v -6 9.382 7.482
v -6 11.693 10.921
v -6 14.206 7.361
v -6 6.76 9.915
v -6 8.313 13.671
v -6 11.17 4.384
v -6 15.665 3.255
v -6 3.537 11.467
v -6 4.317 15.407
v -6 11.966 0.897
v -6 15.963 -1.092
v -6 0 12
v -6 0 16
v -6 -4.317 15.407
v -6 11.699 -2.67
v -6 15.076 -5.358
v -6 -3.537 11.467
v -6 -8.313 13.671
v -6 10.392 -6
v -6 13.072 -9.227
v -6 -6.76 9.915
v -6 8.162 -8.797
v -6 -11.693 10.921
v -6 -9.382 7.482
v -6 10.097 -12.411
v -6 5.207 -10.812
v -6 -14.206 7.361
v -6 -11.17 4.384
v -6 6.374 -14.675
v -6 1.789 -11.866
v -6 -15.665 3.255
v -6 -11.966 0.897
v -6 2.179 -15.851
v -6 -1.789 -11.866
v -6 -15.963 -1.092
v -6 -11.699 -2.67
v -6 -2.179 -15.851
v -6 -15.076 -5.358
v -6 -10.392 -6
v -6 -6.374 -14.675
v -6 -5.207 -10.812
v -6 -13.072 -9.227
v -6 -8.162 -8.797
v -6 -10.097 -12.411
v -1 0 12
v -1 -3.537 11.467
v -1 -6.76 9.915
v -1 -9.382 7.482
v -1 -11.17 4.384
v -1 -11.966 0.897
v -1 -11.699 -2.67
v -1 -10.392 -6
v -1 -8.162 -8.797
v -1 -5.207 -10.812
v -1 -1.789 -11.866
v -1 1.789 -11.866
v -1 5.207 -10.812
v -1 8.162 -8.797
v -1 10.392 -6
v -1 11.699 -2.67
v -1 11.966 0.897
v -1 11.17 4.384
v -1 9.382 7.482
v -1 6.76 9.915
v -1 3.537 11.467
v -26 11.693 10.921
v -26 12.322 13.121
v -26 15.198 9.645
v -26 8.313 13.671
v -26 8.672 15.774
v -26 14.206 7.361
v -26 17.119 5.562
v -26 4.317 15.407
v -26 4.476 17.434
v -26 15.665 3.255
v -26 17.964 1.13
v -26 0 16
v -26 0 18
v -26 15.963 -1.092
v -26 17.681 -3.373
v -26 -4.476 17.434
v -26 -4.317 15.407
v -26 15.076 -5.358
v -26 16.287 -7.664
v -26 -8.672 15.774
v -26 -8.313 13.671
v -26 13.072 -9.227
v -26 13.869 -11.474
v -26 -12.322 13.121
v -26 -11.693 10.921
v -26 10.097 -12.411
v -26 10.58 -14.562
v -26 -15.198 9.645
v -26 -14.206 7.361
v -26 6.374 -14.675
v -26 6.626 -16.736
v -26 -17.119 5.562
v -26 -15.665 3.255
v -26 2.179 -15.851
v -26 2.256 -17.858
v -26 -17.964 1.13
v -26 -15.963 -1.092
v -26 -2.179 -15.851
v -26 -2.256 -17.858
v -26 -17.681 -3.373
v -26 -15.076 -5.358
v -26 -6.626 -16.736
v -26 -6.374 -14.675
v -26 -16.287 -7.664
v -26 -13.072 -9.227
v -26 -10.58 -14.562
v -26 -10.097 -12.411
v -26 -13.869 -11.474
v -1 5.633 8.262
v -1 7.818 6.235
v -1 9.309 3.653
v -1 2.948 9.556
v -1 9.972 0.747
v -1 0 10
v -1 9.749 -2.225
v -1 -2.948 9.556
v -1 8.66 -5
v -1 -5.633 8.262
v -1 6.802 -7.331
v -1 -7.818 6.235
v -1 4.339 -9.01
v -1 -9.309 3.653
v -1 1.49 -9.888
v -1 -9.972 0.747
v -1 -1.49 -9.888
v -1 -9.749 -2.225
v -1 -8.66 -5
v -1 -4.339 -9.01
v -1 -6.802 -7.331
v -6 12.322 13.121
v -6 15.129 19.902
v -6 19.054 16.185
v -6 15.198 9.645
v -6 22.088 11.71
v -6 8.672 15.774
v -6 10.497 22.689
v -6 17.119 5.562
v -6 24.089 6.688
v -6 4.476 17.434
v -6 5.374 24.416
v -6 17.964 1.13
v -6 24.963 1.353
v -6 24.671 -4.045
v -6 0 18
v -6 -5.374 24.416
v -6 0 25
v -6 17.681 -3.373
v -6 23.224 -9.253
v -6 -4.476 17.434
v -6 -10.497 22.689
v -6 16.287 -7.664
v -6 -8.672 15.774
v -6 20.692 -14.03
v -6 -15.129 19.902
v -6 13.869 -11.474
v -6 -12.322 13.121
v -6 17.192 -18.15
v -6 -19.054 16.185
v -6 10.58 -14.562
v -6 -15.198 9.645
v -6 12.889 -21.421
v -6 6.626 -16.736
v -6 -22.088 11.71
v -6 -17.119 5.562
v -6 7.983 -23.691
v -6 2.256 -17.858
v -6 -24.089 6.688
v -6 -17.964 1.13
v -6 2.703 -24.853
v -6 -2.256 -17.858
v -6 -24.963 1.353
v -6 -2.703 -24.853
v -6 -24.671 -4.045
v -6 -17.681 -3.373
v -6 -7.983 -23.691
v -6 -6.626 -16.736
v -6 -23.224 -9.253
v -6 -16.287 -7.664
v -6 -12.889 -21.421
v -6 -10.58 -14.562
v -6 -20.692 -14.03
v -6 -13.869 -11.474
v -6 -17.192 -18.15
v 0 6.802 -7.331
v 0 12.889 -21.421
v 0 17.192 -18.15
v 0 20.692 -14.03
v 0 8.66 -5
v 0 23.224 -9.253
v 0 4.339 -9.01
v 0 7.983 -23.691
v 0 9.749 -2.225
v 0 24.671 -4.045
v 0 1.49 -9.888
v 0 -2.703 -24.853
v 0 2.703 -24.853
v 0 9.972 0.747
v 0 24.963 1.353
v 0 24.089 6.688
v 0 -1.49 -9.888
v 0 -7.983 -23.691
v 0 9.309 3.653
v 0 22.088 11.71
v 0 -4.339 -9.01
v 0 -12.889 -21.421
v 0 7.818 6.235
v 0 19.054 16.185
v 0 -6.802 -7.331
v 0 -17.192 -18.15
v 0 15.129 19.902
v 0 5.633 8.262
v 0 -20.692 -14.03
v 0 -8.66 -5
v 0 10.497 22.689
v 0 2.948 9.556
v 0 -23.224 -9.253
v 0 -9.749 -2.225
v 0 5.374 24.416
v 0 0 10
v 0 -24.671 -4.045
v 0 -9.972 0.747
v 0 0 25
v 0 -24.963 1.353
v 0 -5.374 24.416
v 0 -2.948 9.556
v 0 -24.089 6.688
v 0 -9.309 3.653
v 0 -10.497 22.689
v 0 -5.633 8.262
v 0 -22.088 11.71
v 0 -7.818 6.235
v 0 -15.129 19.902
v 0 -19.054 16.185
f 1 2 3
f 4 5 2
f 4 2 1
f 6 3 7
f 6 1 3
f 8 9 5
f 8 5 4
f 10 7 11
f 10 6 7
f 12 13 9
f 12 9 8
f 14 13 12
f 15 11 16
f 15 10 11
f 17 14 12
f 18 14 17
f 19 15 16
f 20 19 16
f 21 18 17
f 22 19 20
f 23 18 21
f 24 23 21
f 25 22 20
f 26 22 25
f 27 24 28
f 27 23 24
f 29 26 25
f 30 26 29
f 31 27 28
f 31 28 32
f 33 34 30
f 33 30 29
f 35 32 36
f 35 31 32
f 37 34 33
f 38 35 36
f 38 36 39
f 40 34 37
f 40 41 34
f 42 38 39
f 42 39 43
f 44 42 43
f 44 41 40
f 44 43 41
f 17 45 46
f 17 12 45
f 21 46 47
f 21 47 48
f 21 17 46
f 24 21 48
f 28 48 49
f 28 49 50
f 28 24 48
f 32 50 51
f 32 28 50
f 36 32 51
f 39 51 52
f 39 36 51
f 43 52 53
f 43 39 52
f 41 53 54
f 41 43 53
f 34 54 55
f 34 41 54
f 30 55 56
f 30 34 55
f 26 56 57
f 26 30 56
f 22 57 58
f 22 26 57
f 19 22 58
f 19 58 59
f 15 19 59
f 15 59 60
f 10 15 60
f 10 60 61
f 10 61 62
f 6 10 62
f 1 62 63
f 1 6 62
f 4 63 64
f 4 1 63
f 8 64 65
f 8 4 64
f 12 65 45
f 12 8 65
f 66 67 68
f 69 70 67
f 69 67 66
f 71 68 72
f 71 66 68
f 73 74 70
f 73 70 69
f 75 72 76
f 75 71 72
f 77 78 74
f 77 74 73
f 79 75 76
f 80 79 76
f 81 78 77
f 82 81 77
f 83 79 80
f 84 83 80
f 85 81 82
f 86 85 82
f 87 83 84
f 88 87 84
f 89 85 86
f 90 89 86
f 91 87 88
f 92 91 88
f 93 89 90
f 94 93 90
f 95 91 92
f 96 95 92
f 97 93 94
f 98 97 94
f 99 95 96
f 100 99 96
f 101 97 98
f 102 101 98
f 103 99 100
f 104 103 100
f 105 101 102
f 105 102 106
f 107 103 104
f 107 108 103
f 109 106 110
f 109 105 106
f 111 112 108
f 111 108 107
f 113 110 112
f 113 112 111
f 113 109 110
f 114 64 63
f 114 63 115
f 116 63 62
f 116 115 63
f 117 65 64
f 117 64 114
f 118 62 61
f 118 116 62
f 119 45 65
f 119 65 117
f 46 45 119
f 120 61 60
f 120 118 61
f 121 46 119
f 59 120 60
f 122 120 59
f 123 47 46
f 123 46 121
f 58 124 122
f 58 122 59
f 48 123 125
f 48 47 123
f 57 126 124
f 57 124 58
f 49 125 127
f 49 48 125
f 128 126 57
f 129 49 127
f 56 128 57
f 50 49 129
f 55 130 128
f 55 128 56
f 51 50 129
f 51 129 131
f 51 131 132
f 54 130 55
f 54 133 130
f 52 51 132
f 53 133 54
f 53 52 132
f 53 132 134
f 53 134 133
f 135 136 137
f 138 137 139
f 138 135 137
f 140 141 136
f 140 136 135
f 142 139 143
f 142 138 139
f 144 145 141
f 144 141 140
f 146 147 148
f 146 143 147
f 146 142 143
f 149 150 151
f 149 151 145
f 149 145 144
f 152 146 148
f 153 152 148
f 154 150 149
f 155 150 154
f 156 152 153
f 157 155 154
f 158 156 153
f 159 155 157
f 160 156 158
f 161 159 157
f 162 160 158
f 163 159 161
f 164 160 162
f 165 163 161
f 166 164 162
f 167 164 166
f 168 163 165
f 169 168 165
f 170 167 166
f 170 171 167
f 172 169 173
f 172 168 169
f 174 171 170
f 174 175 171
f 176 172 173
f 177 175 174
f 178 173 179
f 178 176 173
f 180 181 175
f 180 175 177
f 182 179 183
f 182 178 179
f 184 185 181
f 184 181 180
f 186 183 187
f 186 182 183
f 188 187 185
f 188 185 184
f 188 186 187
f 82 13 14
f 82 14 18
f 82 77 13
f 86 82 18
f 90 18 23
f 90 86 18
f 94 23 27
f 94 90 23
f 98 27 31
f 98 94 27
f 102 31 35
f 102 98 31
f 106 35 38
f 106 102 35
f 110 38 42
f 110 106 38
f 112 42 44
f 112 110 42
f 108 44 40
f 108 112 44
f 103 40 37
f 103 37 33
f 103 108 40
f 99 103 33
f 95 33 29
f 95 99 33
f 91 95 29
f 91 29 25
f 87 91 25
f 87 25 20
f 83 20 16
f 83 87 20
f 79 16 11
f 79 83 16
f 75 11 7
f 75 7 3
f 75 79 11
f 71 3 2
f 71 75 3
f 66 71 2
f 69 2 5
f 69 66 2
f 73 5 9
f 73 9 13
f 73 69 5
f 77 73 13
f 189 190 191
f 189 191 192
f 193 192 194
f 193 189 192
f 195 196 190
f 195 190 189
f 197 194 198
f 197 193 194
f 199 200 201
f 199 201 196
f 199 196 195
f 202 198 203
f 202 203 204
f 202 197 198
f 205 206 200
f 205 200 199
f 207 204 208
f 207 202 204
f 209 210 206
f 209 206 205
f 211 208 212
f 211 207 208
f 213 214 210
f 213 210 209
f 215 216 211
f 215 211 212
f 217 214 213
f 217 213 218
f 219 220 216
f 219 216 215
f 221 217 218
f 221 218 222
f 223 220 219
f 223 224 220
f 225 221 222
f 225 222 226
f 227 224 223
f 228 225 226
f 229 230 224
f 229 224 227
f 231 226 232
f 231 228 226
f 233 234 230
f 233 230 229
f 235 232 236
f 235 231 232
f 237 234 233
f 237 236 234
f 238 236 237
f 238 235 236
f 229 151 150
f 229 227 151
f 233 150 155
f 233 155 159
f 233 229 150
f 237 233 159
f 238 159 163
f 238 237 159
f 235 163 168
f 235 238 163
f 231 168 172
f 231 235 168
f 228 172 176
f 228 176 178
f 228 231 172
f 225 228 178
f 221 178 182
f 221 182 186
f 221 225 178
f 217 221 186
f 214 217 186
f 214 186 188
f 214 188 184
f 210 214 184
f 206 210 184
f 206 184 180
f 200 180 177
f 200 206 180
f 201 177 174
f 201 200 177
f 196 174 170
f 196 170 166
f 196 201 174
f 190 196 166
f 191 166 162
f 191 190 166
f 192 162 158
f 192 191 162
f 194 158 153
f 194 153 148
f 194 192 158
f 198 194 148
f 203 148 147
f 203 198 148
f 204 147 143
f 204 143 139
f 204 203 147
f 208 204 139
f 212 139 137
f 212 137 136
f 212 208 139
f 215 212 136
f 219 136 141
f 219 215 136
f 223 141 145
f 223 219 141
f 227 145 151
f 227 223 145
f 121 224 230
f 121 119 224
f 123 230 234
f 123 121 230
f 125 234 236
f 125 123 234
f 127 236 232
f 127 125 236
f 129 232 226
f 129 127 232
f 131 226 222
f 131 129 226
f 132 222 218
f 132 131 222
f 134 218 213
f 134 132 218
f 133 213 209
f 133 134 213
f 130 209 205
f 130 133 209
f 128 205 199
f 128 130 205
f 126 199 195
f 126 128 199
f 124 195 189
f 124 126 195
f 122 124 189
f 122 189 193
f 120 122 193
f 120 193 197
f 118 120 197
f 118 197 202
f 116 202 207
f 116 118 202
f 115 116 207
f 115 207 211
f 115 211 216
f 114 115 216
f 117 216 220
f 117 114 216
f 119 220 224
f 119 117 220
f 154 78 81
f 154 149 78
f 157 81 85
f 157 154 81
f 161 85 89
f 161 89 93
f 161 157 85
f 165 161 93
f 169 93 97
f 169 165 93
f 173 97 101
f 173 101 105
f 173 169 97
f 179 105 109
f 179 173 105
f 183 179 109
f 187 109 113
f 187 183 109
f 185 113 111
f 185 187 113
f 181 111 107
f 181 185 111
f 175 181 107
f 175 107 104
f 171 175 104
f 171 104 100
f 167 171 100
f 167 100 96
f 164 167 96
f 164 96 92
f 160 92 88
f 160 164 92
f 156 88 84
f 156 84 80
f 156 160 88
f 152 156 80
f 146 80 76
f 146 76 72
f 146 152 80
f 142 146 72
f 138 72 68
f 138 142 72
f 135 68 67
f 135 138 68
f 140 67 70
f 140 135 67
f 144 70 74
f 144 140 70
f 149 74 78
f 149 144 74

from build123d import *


with BuildPart() as part:
    # Sketch1 → Revolve1 (revolve)
    with BuildSketch(Plane.XY, mode=Mode.PRIVATE) as revolve1_sk:
        Polygon((-1, 12), (-6, 12), (-6, 16), (-26, 16), (-26, 18), (-6, 18), (-6, 25), (0, 25), (0, 10), (-1, 10), align=None)
    revolve(revolve1_sk.sketch.rotate(Axis((-42.809570876, 0, 0), (1, 0, 0)), 90), axis=Axis((-42.809570876, 0, 0), (1, 0, 0)))


solid = part.part
